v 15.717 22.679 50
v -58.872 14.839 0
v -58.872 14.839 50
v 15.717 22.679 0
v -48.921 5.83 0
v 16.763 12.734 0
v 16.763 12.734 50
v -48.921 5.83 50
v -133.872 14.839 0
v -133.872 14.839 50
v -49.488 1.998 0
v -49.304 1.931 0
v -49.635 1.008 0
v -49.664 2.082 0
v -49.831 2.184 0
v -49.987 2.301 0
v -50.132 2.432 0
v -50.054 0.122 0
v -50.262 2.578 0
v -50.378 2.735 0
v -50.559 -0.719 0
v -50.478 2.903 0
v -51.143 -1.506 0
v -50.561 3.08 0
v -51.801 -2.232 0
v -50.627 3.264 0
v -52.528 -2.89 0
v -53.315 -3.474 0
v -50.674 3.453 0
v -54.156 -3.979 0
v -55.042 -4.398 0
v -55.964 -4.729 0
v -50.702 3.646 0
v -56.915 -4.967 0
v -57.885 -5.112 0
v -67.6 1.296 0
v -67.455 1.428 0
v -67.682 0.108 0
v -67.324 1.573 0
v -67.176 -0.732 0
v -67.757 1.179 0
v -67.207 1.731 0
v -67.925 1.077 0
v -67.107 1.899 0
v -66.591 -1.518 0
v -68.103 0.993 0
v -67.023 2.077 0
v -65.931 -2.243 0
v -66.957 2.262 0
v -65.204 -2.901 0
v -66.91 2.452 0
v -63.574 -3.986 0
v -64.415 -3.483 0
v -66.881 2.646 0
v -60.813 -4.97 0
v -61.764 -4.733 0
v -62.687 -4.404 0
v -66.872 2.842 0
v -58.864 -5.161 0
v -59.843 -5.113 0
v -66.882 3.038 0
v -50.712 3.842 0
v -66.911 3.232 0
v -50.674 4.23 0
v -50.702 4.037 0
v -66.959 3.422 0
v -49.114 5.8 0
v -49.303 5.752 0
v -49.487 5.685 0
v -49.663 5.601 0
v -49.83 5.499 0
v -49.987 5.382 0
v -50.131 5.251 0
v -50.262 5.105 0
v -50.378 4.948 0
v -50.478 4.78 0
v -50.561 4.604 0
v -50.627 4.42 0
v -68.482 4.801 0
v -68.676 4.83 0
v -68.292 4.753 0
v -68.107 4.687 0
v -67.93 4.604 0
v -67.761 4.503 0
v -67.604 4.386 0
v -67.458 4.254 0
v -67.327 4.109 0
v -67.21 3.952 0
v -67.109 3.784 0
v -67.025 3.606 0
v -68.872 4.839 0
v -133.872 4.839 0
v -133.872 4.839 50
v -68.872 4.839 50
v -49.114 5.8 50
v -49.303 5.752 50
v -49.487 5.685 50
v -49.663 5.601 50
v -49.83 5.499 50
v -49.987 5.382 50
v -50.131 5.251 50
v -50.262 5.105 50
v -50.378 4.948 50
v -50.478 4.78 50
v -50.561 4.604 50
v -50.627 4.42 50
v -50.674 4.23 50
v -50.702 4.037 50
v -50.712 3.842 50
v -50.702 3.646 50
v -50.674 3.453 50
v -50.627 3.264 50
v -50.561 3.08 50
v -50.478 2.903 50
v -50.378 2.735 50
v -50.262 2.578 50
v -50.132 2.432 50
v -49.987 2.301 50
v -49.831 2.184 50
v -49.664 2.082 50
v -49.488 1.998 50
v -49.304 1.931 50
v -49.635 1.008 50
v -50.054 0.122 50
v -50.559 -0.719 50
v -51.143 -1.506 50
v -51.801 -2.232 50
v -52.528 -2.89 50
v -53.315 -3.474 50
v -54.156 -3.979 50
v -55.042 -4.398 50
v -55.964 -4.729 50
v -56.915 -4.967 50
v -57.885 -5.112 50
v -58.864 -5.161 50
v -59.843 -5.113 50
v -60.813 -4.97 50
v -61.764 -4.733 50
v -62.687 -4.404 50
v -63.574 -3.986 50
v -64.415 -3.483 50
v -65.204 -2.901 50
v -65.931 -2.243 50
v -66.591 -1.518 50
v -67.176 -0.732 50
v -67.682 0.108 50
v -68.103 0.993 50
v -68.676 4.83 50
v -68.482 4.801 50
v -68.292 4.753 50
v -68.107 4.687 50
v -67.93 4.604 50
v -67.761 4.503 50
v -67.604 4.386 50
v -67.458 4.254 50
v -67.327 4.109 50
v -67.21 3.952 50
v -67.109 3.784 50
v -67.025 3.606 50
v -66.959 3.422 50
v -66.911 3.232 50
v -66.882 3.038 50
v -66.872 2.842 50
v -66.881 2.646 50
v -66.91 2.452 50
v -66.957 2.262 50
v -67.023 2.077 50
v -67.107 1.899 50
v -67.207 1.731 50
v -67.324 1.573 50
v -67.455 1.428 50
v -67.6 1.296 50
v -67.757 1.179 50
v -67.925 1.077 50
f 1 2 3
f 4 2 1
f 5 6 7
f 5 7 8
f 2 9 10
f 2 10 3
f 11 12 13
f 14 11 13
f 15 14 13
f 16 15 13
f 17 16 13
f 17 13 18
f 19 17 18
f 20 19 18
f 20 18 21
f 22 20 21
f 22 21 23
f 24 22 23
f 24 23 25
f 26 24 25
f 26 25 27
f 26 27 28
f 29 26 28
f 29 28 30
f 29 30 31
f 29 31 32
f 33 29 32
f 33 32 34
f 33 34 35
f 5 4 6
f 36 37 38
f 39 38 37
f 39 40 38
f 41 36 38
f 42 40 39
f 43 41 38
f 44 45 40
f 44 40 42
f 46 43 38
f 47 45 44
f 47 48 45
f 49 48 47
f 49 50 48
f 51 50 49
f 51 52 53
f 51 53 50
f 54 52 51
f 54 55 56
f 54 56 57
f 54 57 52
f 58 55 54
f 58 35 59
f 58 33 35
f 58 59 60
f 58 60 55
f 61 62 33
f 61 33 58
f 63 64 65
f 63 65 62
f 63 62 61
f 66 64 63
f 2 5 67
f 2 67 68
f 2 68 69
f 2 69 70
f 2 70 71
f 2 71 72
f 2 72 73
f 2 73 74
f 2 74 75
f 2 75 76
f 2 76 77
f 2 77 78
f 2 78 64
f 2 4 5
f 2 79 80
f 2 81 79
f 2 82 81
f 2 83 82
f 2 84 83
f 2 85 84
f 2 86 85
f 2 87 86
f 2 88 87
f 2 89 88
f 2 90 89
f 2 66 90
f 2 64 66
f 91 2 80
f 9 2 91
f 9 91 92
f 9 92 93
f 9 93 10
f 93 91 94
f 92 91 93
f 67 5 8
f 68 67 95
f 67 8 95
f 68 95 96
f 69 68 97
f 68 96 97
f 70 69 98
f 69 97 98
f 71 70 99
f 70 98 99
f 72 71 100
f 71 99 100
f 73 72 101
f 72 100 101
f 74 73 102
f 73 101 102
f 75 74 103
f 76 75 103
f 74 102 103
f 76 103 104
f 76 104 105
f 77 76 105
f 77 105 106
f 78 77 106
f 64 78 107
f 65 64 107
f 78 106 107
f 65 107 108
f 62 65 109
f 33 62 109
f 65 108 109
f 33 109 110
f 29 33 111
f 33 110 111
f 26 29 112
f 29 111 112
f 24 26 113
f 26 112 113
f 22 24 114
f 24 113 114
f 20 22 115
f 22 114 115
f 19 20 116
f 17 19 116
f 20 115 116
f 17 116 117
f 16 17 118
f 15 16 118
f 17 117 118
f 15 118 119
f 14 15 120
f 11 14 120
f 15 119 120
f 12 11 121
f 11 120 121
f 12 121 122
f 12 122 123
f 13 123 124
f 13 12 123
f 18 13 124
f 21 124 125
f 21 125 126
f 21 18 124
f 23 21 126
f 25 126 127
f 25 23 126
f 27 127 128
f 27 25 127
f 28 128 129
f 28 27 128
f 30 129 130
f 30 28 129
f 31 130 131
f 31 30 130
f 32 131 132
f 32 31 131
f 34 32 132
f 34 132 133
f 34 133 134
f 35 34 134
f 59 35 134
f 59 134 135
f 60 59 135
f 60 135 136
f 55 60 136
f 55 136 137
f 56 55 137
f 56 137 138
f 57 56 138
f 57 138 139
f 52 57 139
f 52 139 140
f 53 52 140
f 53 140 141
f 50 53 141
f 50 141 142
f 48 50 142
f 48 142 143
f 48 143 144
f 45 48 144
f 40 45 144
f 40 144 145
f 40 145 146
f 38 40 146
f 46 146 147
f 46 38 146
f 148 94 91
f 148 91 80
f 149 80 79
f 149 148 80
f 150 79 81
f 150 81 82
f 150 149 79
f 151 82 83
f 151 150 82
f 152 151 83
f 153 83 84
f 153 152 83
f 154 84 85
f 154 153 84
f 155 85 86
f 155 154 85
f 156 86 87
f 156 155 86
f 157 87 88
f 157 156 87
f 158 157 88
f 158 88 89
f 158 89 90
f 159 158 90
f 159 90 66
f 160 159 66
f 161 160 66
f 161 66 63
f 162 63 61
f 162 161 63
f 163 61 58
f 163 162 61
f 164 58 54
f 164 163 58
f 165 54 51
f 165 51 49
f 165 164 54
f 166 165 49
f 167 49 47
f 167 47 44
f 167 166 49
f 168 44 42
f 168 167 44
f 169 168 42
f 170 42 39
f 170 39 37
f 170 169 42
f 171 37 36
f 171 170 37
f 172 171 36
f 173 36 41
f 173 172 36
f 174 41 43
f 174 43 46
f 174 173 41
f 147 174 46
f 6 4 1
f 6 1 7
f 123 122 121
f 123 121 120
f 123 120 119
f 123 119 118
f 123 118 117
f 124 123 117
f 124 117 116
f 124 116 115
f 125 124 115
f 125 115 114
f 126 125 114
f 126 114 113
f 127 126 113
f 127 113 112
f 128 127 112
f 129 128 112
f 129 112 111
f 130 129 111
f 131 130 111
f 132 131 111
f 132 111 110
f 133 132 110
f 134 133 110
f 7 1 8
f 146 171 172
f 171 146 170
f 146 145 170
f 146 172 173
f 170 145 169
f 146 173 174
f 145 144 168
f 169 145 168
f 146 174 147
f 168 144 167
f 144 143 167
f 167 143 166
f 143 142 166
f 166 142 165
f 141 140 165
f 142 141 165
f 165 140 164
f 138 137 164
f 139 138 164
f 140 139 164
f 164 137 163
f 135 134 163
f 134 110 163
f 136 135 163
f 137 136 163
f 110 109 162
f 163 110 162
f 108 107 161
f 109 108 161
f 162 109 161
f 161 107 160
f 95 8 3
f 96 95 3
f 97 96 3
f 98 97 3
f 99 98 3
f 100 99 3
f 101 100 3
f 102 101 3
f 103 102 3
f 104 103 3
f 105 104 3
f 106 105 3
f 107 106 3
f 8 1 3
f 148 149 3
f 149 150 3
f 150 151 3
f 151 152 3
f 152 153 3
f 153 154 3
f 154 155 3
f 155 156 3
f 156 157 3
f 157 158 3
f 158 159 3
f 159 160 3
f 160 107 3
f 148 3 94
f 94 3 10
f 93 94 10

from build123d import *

# Parameters (mm, degrees)
BOSS_EXTRUDE1_DEPTH = 50
CUT_EXTRUDE1_DEPTH  = 50


with BuildPart() as part:
    # Sketch2 → Boss-Extrude1 (new body)
    with BuildSketch(Plane.XY):
        with BuildLine():
            Line((-133.871822526, 14.839434035), (-58.871822526, 14.839434035))
            Line((-58.871822526, 14.839434035), (15.717319626, 22.67906878))
            Line((15.717319626, 22.67906878), (16.762604259, 12.733849826))
            Line((16.762604259, 12.733849826), (-48.921026621, 5.830222033))
            ThreePointArc((-48.921026621, 5.830222033), (-58.375818015, -5.148257366), (-68.871822526, 4.839434035))
            Line((-68.871822526, 4.839434035), (-133.871822526, 4.839434035))
            Line((-133.871822526, 4.839434035), (-133.871822526, 14.839434035))
        make_face()
    extrude(amount=BOSS_EXTRUDE1_DEPTH)

    # Sketch4 → Cut-Extrude1 (cut)
    with BuildSketch(Plane.XY.offset(50)):
        with BuildLine():
            Line((-68.871822526, 0.839434035), (-68.871822526, 4.839434035))
            ThreePointArc((-68.871822526, 4.839434035), (-66.871822526, 2.839434035), (-68.871822526, 0.839434035))
        make_face()
        with BuildLine():
            Line((-48.502912768, 1.852134452), (-48.921026621, 5.830222033))
            ThreePointArc((-48.921026621, 5.830222033), (-50.701013486, 3.632121316), (-48.502912768, 1.852134452))
        make_face()
    extrude(amount=-CUT_EXTRUDE1_DEPTH, mode=Mode.SUBTRACT)


solid = part.part
